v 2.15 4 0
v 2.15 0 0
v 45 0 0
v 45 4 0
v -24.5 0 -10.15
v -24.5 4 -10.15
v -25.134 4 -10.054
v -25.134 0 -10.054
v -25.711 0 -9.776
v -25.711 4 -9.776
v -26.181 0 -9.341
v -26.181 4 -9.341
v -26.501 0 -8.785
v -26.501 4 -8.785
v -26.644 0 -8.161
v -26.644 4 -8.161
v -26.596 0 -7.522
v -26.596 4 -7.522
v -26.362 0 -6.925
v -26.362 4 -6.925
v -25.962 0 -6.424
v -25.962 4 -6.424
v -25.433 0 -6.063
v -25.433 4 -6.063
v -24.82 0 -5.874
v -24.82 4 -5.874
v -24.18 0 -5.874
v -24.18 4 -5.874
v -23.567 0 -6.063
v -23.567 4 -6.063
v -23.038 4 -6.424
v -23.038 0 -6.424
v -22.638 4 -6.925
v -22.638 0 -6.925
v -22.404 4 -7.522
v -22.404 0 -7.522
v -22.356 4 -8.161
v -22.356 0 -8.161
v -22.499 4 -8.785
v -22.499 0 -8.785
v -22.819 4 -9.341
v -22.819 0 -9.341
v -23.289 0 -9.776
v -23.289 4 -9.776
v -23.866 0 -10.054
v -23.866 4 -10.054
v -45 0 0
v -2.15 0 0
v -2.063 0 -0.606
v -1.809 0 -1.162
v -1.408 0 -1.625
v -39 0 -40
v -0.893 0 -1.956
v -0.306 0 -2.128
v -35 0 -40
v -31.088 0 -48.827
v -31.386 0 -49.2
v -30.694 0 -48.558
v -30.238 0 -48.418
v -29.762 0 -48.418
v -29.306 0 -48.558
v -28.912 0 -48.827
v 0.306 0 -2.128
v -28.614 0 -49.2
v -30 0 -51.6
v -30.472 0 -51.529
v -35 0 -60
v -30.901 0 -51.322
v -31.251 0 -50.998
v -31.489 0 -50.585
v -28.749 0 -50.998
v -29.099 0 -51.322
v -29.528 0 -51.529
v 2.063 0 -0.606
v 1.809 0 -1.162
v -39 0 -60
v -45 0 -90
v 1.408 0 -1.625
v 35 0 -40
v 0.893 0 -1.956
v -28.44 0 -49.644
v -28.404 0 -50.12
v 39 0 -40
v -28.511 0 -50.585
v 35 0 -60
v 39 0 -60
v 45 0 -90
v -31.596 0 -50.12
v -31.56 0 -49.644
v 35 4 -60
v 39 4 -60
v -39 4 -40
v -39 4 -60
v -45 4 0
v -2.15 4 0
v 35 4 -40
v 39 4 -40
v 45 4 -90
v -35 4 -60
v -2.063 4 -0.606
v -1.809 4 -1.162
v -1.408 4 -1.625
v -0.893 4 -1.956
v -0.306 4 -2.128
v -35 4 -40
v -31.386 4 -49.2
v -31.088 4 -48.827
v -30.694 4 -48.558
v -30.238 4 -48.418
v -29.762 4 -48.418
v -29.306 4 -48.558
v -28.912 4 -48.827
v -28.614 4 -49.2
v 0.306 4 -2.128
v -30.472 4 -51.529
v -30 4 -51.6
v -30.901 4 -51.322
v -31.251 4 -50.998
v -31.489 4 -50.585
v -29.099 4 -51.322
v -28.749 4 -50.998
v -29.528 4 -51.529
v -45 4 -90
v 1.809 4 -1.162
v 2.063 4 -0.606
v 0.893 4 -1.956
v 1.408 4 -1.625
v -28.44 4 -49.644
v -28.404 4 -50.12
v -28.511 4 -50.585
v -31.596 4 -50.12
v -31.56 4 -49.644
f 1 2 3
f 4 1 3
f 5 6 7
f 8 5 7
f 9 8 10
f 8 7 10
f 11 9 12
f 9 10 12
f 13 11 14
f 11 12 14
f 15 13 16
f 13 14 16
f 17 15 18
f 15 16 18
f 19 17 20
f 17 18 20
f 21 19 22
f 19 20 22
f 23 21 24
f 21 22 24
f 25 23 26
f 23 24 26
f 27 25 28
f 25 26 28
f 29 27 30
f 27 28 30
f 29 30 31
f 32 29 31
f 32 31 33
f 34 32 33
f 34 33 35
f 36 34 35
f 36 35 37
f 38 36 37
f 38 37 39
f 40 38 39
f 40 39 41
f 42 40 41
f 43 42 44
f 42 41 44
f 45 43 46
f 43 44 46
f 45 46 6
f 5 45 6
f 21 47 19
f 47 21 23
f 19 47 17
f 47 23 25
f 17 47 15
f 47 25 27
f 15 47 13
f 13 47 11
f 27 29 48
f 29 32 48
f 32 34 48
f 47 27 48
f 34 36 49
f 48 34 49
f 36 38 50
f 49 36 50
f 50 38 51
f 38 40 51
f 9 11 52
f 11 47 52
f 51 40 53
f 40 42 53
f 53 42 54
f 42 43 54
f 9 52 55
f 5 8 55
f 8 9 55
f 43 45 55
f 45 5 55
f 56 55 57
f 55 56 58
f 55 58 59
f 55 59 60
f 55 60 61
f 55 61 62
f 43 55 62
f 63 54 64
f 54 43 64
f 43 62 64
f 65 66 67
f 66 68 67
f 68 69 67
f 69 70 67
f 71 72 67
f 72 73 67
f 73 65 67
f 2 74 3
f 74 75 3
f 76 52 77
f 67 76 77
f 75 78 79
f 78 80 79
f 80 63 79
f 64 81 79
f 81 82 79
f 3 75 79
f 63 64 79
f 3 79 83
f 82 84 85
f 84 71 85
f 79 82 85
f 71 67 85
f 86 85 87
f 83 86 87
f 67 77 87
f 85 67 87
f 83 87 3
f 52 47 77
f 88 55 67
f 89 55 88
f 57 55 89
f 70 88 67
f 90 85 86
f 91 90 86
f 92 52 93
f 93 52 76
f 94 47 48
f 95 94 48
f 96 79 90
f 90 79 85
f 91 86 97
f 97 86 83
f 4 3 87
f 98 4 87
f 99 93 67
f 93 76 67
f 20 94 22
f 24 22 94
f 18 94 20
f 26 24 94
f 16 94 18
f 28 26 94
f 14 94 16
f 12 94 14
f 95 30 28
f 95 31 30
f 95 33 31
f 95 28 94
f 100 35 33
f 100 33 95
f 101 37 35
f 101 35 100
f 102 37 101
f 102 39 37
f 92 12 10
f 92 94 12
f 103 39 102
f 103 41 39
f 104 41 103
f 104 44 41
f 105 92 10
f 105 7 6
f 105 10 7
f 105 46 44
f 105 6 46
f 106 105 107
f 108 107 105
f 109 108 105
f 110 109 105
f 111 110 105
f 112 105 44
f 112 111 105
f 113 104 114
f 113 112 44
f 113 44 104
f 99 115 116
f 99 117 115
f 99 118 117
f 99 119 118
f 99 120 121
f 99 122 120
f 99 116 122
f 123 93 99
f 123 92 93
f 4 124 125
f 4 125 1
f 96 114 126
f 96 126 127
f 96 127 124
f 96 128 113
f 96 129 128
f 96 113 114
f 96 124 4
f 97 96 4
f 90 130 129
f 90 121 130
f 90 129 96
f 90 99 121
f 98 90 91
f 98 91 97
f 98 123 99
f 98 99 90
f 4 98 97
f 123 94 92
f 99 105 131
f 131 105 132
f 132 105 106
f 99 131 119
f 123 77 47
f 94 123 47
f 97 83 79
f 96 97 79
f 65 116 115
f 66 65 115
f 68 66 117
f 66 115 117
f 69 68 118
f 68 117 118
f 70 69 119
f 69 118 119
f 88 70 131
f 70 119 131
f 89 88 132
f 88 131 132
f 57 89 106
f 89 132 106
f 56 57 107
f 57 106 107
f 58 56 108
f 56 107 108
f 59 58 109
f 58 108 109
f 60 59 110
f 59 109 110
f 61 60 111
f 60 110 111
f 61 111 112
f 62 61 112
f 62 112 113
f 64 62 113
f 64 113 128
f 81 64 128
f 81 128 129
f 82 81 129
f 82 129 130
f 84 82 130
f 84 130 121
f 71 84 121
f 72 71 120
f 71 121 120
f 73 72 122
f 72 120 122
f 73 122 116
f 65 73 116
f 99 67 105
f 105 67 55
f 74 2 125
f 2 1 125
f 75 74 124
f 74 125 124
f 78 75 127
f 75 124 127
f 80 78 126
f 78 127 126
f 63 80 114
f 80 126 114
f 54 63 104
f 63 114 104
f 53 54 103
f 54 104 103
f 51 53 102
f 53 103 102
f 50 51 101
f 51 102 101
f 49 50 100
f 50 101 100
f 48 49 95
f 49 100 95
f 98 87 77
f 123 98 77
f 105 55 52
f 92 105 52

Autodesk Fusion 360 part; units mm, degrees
sketch "スケッチ1" plane through (0, 0, 0) normal (0, 1, 0) x (1, 0, 0)
  line L0 (-45, 0) -> (45, 0)
  line L1 (45, 0) -> (45, 90)
  line L2 (45, 90) -> (-45, 90)
  line L3 (-45, 90) -> (-45, 0)
  line L4 (-39, 60) -> (-35, 60)
  line L5 (-35, 60) -> (-35, 40)
  line L6 (-35, 40) -> (-39, 40)
  line L7 (-39, 40) -> (-39, 60)
  line L8 (35, 60) -> (39, 60)
  line L9 (39, 60) -> (39, 40)
  line L10 (39, 40) -> (35, 40)
  line L11 (35, 40) -> (35, 60)
  line L12 (-24.5, 83) -> (24.5, 83)
  line L13 (24.5, 83) -> (24.5, 8)
  line L14 (24.5, 8) -> (-24.5, 8)
  line L15 (-24.5, 8) -> (-24.5, 83)
  line L16 (-35, 50) -> (-30, 50)
  line L17 (35, 50) -> (30, 50)
  point P0 (0, 8)
  dimension "d1" = 90
  dimension "d2" = 90
  dimension "d3" = 40
  dimension "d4" = 20
  dimension "d5" = 4
  dimension "d6" = 35
  dimension "d7" = 35
  dimension "d8" = 49
  dimension "d9" = 75
  dimension "d10" = 8
  dimension "d16" = 5
  dimension "d17" = 5
extrude "押し出し1" add sketch "スケッチ1" along normal blind 4 contours L0 L1 L2 L3 | L12 L13 L14 L15
hole "穴1" at (-24.5, 0, -8) at (0, 0, 0) at (0, 0, 0) at (0, 0, 0) direction (0, 1, 0) diameter 4.3 depth 4 tip angle 118
hole "穴2" at (-30, 0, -50) at (0, 0, 0) direction (0, 1, 0) diameter 3.2 end through all
